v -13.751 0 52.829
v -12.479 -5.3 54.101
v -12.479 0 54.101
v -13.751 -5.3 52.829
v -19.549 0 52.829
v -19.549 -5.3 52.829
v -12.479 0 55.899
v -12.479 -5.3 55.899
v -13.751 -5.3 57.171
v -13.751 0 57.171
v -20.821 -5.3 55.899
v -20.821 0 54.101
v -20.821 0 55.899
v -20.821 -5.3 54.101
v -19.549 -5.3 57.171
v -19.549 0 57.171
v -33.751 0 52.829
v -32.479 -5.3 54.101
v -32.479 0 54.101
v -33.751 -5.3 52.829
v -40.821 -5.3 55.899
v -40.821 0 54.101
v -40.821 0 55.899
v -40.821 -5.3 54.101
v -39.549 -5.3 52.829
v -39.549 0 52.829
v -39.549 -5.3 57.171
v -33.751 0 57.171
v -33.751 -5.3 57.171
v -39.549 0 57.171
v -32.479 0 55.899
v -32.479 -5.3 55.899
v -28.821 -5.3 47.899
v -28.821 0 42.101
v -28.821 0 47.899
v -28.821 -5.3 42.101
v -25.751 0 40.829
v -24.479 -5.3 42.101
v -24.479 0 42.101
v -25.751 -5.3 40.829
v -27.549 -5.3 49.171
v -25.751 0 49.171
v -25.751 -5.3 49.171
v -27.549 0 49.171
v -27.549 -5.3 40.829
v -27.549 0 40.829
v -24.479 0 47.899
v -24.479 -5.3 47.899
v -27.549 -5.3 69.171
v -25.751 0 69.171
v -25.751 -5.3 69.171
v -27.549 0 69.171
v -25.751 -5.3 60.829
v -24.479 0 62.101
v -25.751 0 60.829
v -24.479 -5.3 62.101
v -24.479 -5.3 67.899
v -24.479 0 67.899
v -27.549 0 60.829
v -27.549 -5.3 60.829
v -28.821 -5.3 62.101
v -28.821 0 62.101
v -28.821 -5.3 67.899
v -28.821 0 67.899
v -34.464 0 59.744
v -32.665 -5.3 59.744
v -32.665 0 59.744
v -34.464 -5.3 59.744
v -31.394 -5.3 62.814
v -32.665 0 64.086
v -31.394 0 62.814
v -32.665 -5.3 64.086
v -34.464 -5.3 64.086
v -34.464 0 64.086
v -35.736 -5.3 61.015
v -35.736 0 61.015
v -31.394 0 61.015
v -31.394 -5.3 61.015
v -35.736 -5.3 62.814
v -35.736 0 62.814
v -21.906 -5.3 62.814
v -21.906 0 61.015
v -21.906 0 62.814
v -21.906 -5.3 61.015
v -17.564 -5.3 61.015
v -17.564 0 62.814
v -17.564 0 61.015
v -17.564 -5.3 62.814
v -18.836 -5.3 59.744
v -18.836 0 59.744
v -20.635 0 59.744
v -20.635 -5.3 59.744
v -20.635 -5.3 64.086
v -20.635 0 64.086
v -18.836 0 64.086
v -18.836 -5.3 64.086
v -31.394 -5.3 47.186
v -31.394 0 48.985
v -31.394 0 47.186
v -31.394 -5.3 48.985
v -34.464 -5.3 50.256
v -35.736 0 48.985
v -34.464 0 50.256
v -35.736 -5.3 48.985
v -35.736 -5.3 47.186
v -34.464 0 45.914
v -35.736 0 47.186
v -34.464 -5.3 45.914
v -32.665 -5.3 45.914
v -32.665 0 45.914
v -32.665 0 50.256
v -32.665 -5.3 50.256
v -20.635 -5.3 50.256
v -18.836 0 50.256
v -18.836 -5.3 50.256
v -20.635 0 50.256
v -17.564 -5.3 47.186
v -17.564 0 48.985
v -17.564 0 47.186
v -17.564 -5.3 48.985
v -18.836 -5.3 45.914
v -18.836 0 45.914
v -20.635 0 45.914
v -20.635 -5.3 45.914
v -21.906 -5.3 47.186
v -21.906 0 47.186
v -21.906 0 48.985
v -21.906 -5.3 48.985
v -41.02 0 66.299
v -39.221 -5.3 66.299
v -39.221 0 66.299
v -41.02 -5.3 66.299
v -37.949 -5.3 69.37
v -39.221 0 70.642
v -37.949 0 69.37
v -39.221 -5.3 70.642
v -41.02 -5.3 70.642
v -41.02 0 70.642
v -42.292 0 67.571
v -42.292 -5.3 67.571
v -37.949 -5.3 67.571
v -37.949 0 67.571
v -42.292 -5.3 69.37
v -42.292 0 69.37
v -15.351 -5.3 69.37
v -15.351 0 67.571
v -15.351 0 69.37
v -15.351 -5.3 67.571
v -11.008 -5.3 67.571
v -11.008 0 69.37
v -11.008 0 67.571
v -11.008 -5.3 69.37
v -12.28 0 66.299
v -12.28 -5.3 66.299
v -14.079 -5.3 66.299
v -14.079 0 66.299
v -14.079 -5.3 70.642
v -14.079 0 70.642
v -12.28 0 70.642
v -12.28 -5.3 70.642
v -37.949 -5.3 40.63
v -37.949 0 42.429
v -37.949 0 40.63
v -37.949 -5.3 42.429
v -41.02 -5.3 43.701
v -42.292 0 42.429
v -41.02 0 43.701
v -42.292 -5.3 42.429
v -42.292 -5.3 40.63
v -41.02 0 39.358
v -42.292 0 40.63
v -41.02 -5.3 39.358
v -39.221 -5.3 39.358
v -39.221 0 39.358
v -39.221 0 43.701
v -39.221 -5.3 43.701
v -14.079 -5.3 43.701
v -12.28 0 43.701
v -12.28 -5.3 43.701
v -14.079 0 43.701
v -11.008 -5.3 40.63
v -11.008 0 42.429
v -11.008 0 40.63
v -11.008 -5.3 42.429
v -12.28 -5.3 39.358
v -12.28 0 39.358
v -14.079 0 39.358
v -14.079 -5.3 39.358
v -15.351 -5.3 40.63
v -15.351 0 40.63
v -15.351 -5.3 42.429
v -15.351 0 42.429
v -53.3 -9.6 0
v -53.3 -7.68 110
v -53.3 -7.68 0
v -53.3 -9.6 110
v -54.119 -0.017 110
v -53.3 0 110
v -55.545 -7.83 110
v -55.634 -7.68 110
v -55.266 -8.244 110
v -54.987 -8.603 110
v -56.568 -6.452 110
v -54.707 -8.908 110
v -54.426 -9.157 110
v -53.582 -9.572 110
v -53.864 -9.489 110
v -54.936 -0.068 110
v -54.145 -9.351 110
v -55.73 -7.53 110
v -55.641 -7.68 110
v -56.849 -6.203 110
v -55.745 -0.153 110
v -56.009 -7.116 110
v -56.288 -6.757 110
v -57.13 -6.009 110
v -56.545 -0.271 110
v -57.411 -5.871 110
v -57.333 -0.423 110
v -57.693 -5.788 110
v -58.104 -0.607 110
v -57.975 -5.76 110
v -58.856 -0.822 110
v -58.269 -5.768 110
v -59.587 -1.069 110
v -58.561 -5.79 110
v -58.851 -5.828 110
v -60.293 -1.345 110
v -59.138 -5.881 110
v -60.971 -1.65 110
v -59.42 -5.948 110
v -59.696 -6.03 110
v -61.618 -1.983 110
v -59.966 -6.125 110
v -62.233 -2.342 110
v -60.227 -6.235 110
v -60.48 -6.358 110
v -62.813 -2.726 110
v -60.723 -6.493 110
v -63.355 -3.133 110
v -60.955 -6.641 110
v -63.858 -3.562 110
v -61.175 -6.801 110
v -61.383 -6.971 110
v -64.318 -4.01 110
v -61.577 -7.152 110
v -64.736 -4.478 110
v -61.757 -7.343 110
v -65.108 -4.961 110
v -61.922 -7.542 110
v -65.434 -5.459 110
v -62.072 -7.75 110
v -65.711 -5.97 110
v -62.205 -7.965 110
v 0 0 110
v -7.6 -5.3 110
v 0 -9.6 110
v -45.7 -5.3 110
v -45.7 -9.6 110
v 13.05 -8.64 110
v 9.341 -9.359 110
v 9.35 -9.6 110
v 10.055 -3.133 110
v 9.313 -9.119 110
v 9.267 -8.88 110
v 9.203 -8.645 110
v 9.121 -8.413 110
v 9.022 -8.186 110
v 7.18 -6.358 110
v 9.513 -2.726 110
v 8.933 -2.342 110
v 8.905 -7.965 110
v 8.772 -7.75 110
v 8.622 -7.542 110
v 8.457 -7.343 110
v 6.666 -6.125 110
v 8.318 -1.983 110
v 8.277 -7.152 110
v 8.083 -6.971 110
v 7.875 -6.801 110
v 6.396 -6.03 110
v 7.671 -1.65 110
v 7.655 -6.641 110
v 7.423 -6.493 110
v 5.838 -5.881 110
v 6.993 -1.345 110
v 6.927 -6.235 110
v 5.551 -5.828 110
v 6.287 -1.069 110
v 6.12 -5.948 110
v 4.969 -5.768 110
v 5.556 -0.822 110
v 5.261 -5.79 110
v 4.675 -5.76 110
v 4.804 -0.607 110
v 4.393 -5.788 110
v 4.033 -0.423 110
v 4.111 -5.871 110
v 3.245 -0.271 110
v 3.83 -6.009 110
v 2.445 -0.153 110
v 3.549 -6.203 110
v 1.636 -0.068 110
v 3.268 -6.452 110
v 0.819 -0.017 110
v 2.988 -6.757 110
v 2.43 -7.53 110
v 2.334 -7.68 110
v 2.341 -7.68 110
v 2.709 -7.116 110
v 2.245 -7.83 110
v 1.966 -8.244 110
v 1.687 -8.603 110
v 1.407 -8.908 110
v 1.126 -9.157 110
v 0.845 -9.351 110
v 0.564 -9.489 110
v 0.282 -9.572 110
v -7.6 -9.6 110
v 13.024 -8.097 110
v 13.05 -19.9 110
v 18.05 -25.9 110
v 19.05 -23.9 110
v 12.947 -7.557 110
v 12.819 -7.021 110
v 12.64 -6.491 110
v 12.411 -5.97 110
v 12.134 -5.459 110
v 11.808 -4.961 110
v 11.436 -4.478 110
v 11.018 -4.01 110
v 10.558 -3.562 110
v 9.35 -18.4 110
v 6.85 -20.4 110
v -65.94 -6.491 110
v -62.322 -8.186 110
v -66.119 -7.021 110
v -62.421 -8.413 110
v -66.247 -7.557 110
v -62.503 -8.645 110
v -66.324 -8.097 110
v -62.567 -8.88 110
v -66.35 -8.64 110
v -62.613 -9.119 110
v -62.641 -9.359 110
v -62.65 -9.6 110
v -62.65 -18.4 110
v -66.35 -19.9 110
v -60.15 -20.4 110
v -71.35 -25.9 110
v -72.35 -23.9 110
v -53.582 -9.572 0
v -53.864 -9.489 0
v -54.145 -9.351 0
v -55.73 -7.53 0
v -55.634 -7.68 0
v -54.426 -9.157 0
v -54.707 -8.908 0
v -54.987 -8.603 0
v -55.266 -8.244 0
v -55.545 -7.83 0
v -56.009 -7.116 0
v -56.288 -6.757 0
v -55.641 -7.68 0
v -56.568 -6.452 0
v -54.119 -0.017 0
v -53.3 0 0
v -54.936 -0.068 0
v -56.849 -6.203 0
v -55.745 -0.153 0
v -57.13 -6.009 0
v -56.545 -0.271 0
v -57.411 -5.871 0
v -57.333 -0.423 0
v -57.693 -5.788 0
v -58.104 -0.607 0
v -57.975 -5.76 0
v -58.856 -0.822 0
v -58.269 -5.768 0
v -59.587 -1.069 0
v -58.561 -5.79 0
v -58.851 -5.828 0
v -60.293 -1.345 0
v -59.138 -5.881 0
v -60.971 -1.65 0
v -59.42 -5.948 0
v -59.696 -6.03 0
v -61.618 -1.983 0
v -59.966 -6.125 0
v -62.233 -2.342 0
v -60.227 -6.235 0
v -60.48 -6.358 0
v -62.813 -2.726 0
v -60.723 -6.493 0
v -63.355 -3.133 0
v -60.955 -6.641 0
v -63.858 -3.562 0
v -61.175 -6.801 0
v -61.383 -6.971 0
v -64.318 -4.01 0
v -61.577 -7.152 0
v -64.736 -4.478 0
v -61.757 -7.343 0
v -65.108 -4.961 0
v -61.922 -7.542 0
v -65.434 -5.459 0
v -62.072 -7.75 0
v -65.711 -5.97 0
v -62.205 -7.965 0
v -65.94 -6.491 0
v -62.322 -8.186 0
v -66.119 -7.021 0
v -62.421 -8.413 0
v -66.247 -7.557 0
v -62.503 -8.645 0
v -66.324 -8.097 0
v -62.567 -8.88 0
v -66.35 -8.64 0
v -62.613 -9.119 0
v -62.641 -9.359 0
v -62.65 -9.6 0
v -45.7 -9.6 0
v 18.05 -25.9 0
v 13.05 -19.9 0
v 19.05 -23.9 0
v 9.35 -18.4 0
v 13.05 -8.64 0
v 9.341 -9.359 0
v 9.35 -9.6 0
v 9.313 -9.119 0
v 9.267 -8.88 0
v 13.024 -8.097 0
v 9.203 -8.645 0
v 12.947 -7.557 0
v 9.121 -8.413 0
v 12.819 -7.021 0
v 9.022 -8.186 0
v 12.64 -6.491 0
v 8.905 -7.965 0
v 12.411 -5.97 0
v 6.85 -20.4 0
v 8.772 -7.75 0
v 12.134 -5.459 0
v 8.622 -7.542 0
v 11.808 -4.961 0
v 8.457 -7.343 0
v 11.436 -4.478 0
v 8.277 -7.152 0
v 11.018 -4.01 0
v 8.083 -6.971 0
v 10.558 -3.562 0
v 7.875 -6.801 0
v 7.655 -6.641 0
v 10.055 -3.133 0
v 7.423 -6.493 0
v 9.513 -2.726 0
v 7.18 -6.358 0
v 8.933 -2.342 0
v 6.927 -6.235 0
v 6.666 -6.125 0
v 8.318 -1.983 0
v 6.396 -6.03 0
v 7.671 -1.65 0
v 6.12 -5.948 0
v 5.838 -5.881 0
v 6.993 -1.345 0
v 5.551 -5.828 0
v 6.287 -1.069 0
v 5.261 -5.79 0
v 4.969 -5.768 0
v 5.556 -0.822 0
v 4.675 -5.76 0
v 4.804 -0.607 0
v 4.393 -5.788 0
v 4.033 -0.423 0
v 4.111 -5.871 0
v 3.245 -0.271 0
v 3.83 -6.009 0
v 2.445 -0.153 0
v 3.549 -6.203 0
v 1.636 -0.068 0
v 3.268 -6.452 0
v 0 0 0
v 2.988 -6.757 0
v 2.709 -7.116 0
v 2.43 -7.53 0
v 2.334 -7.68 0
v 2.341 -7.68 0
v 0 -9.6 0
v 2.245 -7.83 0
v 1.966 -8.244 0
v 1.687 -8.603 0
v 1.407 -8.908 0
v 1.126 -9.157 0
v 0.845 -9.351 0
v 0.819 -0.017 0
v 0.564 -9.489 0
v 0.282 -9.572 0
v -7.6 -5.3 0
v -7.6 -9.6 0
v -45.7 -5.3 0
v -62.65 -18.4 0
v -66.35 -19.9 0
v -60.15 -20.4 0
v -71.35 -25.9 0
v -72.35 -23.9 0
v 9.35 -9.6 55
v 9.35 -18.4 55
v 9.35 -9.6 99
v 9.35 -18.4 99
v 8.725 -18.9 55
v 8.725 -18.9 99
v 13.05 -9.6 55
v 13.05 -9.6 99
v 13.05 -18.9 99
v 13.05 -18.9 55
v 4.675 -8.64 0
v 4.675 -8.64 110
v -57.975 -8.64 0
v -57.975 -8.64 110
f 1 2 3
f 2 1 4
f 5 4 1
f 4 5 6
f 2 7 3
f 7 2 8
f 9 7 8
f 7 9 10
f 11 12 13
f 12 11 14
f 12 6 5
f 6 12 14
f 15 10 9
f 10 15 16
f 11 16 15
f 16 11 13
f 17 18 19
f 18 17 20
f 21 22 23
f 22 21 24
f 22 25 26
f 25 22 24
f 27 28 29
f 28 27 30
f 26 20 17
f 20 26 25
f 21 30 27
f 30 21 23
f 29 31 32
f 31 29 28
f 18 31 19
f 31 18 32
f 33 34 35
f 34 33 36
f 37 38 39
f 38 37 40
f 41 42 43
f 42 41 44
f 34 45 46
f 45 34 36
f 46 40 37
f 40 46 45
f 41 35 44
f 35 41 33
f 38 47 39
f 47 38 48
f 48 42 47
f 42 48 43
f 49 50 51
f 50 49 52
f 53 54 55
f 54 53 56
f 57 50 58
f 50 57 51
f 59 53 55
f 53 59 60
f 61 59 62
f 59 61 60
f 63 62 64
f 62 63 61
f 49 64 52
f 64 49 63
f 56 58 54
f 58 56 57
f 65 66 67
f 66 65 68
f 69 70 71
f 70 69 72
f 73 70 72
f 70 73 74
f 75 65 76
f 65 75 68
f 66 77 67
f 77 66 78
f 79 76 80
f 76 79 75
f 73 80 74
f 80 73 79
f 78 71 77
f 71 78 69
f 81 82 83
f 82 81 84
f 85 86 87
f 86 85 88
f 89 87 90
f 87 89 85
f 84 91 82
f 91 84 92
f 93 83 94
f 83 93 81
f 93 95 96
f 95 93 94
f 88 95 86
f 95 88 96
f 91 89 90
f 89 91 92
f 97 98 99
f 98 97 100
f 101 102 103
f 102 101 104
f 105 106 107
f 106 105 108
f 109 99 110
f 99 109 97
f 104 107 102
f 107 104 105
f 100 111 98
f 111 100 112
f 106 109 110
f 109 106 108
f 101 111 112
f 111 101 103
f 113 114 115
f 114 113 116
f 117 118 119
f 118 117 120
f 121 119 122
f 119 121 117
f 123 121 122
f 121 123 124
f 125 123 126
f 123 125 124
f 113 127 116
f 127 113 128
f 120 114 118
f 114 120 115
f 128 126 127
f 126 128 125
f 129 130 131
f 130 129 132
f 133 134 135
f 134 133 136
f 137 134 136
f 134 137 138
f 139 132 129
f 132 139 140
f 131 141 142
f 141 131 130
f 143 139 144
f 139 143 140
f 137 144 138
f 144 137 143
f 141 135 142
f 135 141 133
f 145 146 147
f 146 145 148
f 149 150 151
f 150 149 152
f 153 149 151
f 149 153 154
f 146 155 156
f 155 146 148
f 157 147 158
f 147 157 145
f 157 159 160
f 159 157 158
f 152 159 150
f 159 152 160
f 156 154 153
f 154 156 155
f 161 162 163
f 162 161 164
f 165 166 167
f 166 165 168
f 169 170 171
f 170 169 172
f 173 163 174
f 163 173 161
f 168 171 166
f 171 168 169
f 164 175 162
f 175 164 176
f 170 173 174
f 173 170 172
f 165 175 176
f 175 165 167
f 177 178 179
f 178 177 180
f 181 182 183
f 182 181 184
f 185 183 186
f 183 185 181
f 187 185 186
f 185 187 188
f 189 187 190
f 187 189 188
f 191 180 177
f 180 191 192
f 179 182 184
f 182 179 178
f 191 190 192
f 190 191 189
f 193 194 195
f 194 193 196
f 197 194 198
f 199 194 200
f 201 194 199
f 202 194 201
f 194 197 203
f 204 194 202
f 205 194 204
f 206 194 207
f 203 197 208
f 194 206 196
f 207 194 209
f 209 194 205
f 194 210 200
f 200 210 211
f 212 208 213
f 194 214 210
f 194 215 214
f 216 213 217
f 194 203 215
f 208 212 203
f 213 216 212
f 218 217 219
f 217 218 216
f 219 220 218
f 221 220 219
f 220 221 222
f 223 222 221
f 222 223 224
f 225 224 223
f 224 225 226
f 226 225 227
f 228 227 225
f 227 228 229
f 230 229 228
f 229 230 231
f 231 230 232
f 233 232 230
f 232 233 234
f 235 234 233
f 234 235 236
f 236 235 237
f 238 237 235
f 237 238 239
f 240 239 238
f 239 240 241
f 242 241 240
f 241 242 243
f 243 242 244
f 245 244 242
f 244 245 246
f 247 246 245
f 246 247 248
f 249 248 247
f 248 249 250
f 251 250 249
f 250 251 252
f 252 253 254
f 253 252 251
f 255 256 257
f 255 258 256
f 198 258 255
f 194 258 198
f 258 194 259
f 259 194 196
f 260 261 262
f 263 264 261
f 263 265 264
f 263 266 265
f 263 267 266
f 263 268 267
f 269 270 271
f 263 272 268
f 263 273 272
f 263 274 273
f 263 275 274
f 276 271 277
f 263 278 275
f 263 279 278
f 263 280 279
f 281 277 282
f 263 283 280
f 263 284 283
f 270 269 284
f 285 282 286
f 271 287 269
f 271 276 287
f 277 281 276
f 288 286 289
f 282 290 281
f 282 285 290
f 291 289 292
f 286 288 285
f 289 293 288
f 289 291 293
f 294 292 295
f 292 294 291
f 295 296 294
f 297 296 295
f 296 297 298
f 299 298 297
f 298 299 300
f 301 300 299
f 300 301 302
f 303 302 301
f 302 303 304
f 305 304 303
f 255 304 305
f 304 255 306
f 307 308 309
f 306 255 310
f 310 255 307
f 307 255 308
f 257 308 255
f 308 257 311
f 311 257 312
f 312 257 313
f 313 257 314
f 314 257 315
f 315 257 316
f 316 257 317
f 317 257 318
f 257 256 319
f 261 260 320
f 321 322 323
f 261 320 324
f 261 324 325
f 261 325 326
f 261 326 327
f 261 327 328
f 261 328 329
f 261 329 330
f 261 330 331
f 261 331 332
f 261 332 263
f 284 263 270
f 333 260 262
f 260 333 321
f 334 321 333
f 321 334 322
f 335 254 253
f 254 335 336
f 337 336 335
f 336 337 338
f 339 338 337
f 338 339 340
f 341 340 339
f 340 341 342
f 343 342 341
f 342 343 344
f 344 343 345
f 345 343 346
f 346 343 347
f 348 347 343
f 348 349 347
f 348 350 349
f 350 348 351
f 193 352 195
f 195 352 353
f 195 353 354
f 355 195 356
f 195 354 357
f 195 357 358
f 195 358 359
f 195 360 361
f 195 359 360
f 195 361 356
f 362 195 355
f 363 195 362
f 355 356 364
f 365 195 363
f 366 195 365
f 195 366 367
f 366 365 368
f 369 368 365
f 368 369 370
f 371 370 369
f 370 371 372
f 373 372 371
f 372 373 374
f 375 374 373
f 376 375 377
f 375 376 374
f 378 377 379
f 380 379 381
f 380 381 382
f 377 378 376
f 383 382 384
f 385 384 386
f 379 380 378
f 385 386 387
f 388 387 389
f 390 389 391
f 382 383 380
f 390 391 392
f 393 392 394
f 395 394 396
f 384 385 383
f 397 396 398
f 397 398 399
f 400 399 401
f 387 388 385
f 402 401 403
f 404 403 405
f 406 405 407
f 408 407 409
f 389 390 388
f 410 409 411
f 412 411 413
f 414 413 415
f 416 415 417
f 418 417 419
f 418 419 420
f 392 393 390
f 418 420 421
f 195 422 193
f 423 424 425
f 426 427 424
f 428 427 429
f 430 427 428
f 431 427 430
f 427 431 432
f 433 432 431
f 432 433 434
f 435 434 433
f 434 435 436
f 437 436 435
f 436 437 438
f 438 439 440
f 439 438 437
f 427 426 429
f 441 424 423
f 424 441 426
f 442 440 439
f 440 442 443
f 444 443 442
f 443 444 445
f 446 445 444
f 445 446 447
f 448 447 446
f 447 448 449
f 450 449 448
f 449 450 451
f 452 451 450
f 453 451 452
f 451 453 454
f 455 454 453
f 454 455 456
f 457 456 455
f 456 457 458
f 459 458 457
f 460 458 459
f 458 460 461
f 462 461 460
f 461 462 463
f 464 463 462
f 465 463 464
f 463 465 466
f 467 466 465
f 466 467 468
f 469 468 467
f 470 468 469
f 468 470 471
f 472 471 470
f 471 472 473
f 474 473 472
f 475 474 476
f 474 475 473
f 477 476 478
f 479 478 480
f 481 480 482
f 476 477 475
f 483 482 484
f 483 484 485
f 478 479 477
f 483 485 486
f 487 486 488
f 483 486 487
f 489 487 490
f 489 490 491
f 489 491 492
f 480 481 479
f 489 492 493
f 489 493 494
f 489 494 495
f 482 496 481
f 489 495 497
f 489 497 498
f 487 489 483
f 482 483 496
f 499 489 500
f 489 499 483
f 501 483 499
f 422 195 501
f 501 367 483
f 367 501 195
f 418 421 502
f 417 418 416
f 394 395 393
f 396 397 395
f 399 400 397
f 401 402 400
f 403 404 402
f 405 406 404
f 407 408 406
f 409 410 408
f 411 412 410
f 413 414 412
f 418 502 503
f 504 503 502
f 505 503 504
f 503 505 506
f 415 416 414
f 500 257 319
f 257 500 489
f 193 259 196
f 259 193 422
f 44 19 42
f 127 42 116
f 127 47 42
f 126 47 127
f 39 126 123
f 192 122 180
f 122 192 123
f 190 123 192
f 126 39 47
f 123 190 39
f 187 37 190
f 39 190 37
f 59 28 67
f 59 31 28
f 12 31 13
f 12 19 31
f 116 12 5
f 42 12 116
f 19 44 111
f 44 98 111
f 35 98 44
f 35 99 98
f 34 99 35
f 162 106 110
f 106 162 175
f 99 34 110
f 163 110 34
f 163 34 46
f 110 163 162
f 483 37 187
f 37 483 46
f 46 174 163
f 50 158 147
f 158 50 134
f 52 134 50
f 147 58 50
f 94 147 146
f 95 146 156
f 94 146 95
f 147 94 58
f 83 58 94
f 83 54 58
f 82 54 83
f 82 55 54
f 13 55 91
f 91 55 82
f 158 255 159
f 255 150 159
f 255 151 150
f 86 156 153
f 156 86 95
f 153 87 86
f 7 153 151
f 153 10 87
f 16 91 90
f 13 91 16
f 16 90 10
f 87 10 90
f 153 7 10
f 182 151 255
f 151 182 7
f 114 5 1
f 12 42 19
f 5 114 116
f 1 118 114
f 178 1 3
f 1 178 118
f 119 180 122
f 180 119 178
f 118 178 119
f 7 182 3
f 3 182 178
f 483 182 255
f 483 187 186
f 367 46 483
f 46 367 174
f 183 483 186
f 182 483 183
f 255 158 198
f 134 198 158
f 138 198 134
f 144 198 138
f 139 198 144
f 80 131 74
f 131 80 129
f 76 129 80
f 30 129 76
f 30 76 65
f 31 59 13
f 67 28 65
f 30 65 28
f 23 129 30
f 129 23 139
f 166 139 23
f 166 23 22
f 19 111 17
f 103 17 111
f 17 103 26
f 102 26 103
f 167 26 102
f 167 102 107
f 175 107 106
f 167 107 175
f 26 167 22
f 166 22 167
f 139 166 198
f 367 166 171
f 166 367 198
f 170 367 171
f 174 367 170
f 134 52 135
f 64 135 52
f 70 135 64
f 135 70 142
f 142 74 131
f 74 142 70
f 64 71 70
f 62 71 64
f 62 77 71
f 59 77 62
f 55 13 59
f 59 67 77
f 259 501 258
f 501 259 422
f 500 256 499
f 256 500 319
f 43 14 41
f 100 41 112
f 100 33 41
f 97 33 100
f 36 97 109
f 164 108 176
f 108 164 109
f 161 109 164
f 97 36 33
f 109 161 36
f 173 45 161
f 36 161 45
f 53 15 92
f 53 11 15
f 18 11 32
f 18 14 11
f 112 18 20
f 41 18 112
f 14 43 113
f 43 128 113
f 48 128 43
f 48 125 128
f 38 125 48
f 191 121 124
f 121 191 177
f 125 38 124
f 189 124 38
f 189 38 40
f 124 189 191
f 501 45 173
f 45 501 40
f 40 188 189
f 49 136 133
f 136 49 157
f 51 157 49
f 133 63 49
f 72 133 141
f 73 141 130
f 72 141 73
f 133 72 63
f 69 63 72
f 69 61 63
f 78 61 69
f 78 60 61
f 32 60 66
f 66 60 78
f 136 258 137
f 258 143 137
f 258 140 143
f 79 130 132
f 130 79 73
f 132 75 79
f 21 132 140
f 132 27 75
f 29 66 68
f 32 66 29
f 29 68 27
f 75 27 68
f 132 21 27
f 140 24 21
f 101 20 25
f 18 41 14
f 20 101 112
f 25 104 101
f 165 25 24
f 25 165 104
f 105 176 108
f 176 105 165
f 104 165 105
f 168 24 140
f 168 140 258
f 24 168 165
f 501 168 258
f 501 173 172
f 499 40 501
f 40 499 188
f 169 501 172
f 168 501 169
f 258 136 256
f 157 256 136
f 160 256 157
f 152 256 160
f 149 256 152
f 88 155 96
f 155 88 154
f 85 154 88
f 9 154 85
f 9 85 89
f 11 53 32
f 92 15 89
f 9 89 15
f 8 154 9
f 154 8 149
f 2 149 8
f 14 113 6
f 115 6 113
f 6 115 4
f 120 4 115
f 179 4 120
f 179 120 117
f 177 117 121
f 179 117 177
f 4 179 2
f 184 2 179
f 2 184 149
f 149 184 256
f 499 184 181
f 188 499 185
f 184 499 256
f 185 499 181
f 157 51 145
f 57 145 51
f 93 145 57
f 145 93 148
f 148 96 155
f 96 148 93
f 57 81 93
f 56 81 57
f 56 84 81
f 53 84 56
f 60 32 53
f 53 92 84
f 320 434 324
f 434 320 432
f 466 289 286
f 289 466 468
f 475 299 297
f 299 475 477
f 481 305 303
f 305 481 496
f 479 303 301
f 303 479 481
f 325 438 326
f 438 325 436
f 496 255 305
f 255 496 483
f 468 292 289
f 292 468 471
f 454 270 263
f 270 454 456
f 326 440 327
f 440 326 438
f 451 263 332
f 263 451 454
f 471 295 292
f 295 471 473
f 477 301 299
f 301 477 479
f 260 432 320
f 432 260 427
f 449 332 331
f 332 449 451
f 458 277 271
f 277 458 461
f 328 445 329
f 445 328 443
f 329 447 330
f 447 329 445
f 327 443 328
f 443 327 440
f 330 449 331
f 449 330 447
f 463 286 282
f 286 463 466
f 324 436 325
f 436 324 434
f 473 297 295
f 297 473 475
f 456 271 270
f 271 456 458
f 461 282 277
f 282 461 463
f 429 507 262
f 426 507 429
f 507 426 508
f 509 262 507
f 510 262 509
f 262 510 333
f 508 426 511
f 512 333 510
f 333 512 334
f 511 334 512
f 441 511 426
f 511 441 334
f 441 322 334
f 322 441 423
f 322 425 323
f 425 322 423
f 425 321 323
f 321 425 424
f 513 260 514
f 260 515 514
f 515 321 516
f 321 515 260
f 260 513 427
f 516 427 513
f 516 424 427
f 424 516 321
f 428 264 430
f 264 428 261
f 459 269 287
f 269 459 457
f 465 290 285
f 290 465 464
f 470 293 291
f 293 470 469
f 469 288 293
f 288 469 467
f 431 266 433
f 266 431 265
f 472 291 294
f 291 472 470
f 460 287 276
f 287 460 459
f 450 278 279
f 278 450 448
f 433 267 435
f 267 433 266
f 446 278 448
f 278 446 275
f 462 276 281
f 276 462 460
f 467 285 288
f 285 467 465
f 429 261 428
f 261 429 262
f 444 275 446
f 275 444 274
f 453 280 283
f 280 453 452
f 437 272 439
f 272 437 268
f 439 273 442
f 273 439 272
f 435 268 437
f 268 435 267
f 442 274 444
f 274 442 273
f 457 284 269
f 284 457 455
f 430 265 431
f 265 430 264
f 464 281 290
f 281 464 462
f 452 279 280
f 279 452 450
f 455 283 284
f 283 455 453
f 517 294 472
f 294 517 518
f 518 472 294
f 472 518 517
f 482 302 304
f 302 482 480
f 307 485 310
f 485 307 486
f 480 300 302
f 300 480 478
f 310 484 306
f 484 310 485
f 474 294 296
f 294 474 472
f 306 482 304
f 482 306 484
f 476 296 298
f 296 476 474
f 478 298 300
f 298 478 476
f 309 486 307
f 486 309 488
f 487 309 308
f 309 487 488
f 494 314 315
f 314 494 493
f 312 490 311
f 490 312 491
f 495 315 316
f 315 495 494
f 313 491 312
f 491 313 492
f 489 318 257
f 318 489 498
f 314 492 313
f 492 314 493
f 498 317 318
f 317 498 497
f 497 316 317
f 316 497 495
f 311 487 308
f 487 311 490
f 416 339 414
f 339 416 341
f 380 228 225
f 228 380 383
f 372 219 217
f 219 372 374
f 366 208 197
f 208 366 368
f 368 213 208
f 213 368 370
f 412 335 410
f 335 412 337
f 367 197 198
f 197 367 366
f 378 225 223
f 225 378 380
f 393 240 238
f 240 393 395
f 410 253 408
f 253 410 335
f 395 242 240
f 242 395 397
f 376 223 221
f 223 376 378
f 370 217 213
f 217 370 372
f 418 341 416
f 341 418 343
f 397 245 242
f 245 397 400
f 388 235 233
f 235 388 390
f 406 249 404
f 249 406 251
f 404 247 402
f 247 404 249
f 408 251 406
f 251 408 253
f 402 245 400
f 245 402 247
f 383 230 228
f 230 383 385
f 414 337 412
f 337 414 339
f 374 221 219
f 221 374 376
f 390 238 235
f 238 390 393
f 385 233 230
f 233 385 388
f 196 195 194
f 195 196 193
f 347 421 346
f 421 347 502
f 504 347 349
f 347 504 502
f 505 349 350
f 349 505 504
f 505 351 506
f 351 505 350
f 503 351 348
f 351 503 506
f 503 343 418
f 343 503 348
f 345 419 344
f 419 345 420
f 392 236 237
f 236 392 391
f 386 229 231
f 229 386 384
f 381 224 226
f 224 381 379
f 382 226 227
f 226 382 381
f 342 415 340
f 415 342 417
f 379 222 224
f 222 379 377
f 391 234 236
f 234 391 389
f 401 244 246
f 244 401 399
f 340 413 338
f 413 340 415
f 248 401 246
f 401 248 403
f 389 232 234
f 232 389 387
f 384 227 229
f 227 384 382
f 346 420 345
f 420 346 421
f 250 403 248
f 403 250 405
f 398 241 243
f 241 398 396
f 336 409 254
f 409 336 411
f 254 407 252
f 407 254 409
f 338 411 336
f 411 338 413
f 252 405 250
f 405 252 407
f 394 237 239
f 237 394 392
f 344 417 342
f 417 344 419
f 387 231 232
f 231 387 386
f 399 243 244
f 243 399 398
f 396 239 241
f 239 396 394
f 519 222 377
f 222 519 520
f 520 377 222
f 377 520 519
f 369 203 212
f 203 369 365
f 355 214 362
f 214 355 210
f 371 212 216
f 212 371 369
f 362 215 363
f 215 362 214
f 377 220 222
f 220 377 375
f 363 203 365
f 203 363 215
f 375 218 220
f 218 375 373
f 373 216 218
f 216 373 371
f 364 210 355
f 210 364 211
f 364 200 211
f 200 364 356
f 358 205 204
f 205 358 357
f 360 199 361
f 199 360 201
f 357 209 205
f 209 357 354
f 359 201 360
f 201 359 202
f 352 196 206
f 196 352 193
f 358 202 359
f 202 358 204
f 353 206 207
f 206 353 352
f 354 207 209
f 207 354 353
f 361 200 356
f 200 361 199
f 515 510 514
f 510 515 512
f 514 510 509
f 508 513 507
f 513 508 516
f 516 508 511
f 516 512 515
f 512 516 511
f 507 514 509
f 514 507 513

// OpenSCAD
// in mm.  ZTE Speed is 66, Moto E4 is 72
phone_width = 72; // [54:0.5:100]

// in mm.  ZTE Speed is 10.2, Moto E4 is 9.3
phone_thickness = 9.3; //[5:0.1:20]

// in mm.  
clip_thickness=110; //[50:1:200]

// extended actobotics hole pattern?
actHoles="false"; //[true,false]

// extended goBILDA hole pattern?
gbHoles="false"; //[true,false]

// extended tetrix hole pattern?
tetHoles="false"; //[true,false]

// gap in top right?
gaptr="true"; //[true,false]

// gap in top left?
gaptl="false"; //[true,false]

// gap in bottom right?
gapbr="false"; //[true,false]

// gap in bottom left?
gapbl="false"; //[true,false]



/* [Hidden] */
ht=3.2;
cWid=3.7; // mm. width of clips

// preview[view:south, tilt:top]

i2m = 25.4; // inches to mm

// base with slots
bLen=53.3;
bWid=9.6;

/* [Hidden] */
i2m=25.4; // inches to mm
rHole=2.35; //mm
base_length=bLen; //[1.5:0.25:4.5]

rotate(180)
wholeClip();


//if (two_clips=="true") {
//translate([0,-3,0])
//mirror([0,1,0])
//wholeClip();
//}

module wholeClip() {
    
difference() {  // remove side gaps
    
union() { // base plus clips
    
difference() { // base w/ holes
    
    cube([bLen, bWid, clip_thickness]);
    
    translate([(bLen-1.5*25.4)/2, bWid-4.3, -1])
    cube([1.5*25.4, 4.3+0.01, clip_thickness+2]);
    
 //   if (clip_thickness>3.2) {
 //   translate([bLen/2-(22)/2, 0,ht])
 //   cube([22, bWid+2, clip_thickness]);
 //  }
    

    translate([bLen/2,20,clip_thickness/2])
    rotate(v=[1,0,0], a=90) {
        
       
    gobildaTetrixHoles();
if (gbHoles=="true") { 
    translate([0,24,0])
    gobildaHoles();
    
    translate([0,-24,0])
    gobildaHoles();
    
    translate([0,36,0])
    gobildaHoles();
    
    translate([0,-36,0])
    gobildaHoles();
}

if (tetHoles=="true") { 
    translate([0,32,0])
    tetrixHoles();
    
    translate([0,-32,0])
    tetrixHoles();
}

if (actHoles=="true") {    
    translate([0,1.5*25.4,0])
    actoboticsHoles();
    
    translate([0,-1.5*25.4,0])
    actoboticsHoles();
}

    
   
    actoboticsHoles();
if (actHoles=="true") {
}

}
 /*   translate([bLen/2-(13.3+0.3)/2, 2.3, -2])
    cube([13.3+0.3, ht+0.3, 10]);
    
    translate([bLen/2-1.5/2*i2m, 2.3, -2])
    cube([5,ht+0.3, 10]);
    
    translate([bLen/2+1.5/2*i2m -5, 2.3, -2])
    cube([5,ht+0.3, 10]);*/
}

clip();

translate([bLen,0,0])
mirror([1,0,0])
clip();
}

if (gaptl=="true") {
    translate([bLen,bWid+0.0001,clip_thickness*.5])
    cube([2*bLen, phone_thickness, clip_thickness*0.40]);
}

if (gaptr=="true") {
    translate([-bLen,bWid+0.0001,clip_thickness*.5])
    cube([2*bLen, phone_thickness, clip_thickness*0.40]);
}

if (gapbl=="true") {
    translate([bLen,bWid+0.0001,clip_thickness*.1])
    cube([2*bLen, phone_thickness, clip_thickness*0.400001]);
}

if (gapbr=="true") {
    translate([-bLen,bWid+0.0001,clip_thickness*.1])
    cube([2*bLen, phone_thickness, clip_thickness*0.400001]);
}

}

module clip() {
    
degr=10;
    
difference() {
union() {
// original clip    
linear_extrude(height=clip_thickness)
polygon([
[0,0],
[bLen/2 - phone_width/2-cWid, bWid*0.9],
[bLen/2 - phone_width/2-cWid, bWid+phone_thickness+1],
[bLen/2 - phone_width/2-6-cWid, bWid+phone_thickness+5],
[bLen/2 - phone_width/2-5-cWid, bWid+phone_thickness+7],
[bLen/2 - phone_width/2 +2.5, bWid+phone_thickness+1.5],
[bLen/2 - phone_width/2 , bWid+phone_thickness-0.5],
[bLen/2 - phone_width/2 , bWid],
     
[(bLen/2 - phone_width/2)/2 , bWid*0.8],
    
[0,bWid*0.8],
[1,bWid*0.8]]);

    
// 1/4 circle base
translate([0,bWid*0.9,0])
scale([bLen/2 - phone_width/2-cWid, bWid*0.9, 1])
rotate(180) quarterCylinder(100);
}

translate([(bLen/2 - phone_width/2)/2,bWid*0.8,-1])
cube([-(bLen/2 - phone_width/2)/2,bWid*(1-0.8), 1000]);

translate([(bLen/2 - phone_width/2)/2,bWid,0])
scale([(bLen/2 - phone_width/2)/2, bWid*0.4, 1])
rotate(180) quarterCylinder(100);

translate([(bLen/2 - phone_width/2)/2,bWid*0.6+bWid*0.2/(1-cos(degr)),0])
scale([(bLen/2 - phone_width/2)/4/(sin(degr)), bWid*0.2/(1-cos(degr)), 1])
rotate(-270) quarterCylinder(300);


}

intersection() {
translate([0,bWid-bWid*0.2/(1-cos(degr)),0])
scale([(bLen/2 - phone_width/2)/4/(sin(degr)), bWid*0.2/(1-cos(degr)), 1])
rotate(270) quarterCylinder(300);
    
translate([(bLen/2 - phone_width/2)/4,bWid*0.5,0])
cube(1000);
    
}

module quarterCylinder(ne) {
rotate(180)
difference() {
cylinder(h=clip_thickness, r=1, $fn=ne);
translate([50, 0, -1]) 
    scale([-1,1,1])
cube(1000);
translate([0, -50, -1]) scale([-1,1,1])
cube(1000);
}
}
}

module gobildaTetrixHoles() {
        // gobilda+tetrix holes
    hull() {
    
    translate([0 - 8, 0, -2])
            rotate(180/8)
    cylinder(h=100, r=rHole, $fn=8);
            translate([0 - 12, 0, -2])
            rotate(180/8)
    cylinder(h=100, r=rHole, $fn=8);
    }
    
    hull() {
    translate([0 + 8, 0, -2])
            rotate(180/8)
    cylinder(h=100, r=rHole, $fn=8);
        
    translate([0 + 12, 0, -2])
            rotate(180/8)
    cylinder(h=100, r=rHole, $fn=8);
    }
    
    hull() {
    translate([0 , 0 -8, -2])
            rotate(180/8)
    cylinder(h=100, r=rHole, $fn=8);
        
    translate([0 , 0 -12, -2])
            rotate(180/8)
    cylinder(h=100, r=rHole, $fn=8);
    }
    
    hull() {
    translate([0, 0 +8, -2])
            rotate(180/8)
    cylinder(h=100, r=rHole, $fn=8);
        
    translate([0, 0 +12, -2])
            rotate(180/8)
    cylinder(h=100, r=rHole, $fn=8);
    }
}

module gobildaHoles() {

    translate([0 - 12, 0, -2])
            rotate(180/8)
    cylinder(h=100, r=rHole, $fn=8);

        
    translate([0 + 12, 0, -2])
            rotate(180/8)
    cylinder(h=100, r=rHole, $fn=8);

        
    translate([0 , 0 -12, -2])
            rotate(180/8)
    cylinder(h=100, r=rHole, $fn=8);

        
    translate([0, 0 +12, -2])
            rotate(180/8)
    cylinder(h=100, r=rHole, $fn=8);
}

module tetrixHoles() {

    translate([0 - 8, 0, -2])
            rotate(180/8)
    cylinder(h=100, r=rHole, $fn=8);

        
    translate([0 + 8, 0, -2])
            rotate(180/8)
    cylinder(h=100, r=rHole, $fn=8);

        
    translate([0 , 0 -8, -2])
            rotate(180/8)
    cylinder(h=100, r=rHole, $fn=8);

        
    translate([0, 0 +8, -2])
            rotate(180/8)
    cylinder(h=100, r=rHole, $fn=8);
}

module actoboticsHoles() {
        // actobotics inner holes
    translate([0, 0, -2])
    rotate(45)
    translate([0.77/2*i2m, 0, -2])
            rotate(180/8)
    cylinder(h=100, r=rHole, $fn=8);
    
    translate([0, 0, -2])
    rotate(135)
    translate([0.77/2*i2m, 0, -2])
            rotate(180/8)
    cylinder(h=100, r=rHole, $fn=8);
    
    translate([0, 0, -2])
    rotate(-45)
    translate([0.77/2*i2m, 0, -2])
        rotate(180/8)
    cylinder(h=100, r=rHole, $fn=8);
    
    translate([0, 0, -2])
    rotate(-135)
    translate([0.77/2*i2m, 0, -2])
        rotate(180/8)
    cylinder(h=100, r=rHole, $fn=8);
    
    // actobotics outer holes
    translate([0, 0, -2])
    rotate(45)
    translate([0.75*i2m, 0, -2])
        rotate(180/8)
    cylinder(h=100, r=rHole, $fn=8);
    
    translate([0, 0, -2])
    rotate(135)
    translate([0.75*i2m, 0, -2])
        rotate(180/8)
    cylinder(h=100, r=rHole, $fn=8);
    
    translate([0, 0, -2])
    rotate(-45)
    translate([0.75*i2m, 0, -2])
        rotate(180/8)
    cylinder(h=100, r=rHole, $fn=8);
    
    translate([0, 0, -2])
    rotate(-135)
    translate([0.75*i2m, 0, -2])
    rotate(180/8)
    cylinder(h=100, r=rHole, $fn=8);
}
}
